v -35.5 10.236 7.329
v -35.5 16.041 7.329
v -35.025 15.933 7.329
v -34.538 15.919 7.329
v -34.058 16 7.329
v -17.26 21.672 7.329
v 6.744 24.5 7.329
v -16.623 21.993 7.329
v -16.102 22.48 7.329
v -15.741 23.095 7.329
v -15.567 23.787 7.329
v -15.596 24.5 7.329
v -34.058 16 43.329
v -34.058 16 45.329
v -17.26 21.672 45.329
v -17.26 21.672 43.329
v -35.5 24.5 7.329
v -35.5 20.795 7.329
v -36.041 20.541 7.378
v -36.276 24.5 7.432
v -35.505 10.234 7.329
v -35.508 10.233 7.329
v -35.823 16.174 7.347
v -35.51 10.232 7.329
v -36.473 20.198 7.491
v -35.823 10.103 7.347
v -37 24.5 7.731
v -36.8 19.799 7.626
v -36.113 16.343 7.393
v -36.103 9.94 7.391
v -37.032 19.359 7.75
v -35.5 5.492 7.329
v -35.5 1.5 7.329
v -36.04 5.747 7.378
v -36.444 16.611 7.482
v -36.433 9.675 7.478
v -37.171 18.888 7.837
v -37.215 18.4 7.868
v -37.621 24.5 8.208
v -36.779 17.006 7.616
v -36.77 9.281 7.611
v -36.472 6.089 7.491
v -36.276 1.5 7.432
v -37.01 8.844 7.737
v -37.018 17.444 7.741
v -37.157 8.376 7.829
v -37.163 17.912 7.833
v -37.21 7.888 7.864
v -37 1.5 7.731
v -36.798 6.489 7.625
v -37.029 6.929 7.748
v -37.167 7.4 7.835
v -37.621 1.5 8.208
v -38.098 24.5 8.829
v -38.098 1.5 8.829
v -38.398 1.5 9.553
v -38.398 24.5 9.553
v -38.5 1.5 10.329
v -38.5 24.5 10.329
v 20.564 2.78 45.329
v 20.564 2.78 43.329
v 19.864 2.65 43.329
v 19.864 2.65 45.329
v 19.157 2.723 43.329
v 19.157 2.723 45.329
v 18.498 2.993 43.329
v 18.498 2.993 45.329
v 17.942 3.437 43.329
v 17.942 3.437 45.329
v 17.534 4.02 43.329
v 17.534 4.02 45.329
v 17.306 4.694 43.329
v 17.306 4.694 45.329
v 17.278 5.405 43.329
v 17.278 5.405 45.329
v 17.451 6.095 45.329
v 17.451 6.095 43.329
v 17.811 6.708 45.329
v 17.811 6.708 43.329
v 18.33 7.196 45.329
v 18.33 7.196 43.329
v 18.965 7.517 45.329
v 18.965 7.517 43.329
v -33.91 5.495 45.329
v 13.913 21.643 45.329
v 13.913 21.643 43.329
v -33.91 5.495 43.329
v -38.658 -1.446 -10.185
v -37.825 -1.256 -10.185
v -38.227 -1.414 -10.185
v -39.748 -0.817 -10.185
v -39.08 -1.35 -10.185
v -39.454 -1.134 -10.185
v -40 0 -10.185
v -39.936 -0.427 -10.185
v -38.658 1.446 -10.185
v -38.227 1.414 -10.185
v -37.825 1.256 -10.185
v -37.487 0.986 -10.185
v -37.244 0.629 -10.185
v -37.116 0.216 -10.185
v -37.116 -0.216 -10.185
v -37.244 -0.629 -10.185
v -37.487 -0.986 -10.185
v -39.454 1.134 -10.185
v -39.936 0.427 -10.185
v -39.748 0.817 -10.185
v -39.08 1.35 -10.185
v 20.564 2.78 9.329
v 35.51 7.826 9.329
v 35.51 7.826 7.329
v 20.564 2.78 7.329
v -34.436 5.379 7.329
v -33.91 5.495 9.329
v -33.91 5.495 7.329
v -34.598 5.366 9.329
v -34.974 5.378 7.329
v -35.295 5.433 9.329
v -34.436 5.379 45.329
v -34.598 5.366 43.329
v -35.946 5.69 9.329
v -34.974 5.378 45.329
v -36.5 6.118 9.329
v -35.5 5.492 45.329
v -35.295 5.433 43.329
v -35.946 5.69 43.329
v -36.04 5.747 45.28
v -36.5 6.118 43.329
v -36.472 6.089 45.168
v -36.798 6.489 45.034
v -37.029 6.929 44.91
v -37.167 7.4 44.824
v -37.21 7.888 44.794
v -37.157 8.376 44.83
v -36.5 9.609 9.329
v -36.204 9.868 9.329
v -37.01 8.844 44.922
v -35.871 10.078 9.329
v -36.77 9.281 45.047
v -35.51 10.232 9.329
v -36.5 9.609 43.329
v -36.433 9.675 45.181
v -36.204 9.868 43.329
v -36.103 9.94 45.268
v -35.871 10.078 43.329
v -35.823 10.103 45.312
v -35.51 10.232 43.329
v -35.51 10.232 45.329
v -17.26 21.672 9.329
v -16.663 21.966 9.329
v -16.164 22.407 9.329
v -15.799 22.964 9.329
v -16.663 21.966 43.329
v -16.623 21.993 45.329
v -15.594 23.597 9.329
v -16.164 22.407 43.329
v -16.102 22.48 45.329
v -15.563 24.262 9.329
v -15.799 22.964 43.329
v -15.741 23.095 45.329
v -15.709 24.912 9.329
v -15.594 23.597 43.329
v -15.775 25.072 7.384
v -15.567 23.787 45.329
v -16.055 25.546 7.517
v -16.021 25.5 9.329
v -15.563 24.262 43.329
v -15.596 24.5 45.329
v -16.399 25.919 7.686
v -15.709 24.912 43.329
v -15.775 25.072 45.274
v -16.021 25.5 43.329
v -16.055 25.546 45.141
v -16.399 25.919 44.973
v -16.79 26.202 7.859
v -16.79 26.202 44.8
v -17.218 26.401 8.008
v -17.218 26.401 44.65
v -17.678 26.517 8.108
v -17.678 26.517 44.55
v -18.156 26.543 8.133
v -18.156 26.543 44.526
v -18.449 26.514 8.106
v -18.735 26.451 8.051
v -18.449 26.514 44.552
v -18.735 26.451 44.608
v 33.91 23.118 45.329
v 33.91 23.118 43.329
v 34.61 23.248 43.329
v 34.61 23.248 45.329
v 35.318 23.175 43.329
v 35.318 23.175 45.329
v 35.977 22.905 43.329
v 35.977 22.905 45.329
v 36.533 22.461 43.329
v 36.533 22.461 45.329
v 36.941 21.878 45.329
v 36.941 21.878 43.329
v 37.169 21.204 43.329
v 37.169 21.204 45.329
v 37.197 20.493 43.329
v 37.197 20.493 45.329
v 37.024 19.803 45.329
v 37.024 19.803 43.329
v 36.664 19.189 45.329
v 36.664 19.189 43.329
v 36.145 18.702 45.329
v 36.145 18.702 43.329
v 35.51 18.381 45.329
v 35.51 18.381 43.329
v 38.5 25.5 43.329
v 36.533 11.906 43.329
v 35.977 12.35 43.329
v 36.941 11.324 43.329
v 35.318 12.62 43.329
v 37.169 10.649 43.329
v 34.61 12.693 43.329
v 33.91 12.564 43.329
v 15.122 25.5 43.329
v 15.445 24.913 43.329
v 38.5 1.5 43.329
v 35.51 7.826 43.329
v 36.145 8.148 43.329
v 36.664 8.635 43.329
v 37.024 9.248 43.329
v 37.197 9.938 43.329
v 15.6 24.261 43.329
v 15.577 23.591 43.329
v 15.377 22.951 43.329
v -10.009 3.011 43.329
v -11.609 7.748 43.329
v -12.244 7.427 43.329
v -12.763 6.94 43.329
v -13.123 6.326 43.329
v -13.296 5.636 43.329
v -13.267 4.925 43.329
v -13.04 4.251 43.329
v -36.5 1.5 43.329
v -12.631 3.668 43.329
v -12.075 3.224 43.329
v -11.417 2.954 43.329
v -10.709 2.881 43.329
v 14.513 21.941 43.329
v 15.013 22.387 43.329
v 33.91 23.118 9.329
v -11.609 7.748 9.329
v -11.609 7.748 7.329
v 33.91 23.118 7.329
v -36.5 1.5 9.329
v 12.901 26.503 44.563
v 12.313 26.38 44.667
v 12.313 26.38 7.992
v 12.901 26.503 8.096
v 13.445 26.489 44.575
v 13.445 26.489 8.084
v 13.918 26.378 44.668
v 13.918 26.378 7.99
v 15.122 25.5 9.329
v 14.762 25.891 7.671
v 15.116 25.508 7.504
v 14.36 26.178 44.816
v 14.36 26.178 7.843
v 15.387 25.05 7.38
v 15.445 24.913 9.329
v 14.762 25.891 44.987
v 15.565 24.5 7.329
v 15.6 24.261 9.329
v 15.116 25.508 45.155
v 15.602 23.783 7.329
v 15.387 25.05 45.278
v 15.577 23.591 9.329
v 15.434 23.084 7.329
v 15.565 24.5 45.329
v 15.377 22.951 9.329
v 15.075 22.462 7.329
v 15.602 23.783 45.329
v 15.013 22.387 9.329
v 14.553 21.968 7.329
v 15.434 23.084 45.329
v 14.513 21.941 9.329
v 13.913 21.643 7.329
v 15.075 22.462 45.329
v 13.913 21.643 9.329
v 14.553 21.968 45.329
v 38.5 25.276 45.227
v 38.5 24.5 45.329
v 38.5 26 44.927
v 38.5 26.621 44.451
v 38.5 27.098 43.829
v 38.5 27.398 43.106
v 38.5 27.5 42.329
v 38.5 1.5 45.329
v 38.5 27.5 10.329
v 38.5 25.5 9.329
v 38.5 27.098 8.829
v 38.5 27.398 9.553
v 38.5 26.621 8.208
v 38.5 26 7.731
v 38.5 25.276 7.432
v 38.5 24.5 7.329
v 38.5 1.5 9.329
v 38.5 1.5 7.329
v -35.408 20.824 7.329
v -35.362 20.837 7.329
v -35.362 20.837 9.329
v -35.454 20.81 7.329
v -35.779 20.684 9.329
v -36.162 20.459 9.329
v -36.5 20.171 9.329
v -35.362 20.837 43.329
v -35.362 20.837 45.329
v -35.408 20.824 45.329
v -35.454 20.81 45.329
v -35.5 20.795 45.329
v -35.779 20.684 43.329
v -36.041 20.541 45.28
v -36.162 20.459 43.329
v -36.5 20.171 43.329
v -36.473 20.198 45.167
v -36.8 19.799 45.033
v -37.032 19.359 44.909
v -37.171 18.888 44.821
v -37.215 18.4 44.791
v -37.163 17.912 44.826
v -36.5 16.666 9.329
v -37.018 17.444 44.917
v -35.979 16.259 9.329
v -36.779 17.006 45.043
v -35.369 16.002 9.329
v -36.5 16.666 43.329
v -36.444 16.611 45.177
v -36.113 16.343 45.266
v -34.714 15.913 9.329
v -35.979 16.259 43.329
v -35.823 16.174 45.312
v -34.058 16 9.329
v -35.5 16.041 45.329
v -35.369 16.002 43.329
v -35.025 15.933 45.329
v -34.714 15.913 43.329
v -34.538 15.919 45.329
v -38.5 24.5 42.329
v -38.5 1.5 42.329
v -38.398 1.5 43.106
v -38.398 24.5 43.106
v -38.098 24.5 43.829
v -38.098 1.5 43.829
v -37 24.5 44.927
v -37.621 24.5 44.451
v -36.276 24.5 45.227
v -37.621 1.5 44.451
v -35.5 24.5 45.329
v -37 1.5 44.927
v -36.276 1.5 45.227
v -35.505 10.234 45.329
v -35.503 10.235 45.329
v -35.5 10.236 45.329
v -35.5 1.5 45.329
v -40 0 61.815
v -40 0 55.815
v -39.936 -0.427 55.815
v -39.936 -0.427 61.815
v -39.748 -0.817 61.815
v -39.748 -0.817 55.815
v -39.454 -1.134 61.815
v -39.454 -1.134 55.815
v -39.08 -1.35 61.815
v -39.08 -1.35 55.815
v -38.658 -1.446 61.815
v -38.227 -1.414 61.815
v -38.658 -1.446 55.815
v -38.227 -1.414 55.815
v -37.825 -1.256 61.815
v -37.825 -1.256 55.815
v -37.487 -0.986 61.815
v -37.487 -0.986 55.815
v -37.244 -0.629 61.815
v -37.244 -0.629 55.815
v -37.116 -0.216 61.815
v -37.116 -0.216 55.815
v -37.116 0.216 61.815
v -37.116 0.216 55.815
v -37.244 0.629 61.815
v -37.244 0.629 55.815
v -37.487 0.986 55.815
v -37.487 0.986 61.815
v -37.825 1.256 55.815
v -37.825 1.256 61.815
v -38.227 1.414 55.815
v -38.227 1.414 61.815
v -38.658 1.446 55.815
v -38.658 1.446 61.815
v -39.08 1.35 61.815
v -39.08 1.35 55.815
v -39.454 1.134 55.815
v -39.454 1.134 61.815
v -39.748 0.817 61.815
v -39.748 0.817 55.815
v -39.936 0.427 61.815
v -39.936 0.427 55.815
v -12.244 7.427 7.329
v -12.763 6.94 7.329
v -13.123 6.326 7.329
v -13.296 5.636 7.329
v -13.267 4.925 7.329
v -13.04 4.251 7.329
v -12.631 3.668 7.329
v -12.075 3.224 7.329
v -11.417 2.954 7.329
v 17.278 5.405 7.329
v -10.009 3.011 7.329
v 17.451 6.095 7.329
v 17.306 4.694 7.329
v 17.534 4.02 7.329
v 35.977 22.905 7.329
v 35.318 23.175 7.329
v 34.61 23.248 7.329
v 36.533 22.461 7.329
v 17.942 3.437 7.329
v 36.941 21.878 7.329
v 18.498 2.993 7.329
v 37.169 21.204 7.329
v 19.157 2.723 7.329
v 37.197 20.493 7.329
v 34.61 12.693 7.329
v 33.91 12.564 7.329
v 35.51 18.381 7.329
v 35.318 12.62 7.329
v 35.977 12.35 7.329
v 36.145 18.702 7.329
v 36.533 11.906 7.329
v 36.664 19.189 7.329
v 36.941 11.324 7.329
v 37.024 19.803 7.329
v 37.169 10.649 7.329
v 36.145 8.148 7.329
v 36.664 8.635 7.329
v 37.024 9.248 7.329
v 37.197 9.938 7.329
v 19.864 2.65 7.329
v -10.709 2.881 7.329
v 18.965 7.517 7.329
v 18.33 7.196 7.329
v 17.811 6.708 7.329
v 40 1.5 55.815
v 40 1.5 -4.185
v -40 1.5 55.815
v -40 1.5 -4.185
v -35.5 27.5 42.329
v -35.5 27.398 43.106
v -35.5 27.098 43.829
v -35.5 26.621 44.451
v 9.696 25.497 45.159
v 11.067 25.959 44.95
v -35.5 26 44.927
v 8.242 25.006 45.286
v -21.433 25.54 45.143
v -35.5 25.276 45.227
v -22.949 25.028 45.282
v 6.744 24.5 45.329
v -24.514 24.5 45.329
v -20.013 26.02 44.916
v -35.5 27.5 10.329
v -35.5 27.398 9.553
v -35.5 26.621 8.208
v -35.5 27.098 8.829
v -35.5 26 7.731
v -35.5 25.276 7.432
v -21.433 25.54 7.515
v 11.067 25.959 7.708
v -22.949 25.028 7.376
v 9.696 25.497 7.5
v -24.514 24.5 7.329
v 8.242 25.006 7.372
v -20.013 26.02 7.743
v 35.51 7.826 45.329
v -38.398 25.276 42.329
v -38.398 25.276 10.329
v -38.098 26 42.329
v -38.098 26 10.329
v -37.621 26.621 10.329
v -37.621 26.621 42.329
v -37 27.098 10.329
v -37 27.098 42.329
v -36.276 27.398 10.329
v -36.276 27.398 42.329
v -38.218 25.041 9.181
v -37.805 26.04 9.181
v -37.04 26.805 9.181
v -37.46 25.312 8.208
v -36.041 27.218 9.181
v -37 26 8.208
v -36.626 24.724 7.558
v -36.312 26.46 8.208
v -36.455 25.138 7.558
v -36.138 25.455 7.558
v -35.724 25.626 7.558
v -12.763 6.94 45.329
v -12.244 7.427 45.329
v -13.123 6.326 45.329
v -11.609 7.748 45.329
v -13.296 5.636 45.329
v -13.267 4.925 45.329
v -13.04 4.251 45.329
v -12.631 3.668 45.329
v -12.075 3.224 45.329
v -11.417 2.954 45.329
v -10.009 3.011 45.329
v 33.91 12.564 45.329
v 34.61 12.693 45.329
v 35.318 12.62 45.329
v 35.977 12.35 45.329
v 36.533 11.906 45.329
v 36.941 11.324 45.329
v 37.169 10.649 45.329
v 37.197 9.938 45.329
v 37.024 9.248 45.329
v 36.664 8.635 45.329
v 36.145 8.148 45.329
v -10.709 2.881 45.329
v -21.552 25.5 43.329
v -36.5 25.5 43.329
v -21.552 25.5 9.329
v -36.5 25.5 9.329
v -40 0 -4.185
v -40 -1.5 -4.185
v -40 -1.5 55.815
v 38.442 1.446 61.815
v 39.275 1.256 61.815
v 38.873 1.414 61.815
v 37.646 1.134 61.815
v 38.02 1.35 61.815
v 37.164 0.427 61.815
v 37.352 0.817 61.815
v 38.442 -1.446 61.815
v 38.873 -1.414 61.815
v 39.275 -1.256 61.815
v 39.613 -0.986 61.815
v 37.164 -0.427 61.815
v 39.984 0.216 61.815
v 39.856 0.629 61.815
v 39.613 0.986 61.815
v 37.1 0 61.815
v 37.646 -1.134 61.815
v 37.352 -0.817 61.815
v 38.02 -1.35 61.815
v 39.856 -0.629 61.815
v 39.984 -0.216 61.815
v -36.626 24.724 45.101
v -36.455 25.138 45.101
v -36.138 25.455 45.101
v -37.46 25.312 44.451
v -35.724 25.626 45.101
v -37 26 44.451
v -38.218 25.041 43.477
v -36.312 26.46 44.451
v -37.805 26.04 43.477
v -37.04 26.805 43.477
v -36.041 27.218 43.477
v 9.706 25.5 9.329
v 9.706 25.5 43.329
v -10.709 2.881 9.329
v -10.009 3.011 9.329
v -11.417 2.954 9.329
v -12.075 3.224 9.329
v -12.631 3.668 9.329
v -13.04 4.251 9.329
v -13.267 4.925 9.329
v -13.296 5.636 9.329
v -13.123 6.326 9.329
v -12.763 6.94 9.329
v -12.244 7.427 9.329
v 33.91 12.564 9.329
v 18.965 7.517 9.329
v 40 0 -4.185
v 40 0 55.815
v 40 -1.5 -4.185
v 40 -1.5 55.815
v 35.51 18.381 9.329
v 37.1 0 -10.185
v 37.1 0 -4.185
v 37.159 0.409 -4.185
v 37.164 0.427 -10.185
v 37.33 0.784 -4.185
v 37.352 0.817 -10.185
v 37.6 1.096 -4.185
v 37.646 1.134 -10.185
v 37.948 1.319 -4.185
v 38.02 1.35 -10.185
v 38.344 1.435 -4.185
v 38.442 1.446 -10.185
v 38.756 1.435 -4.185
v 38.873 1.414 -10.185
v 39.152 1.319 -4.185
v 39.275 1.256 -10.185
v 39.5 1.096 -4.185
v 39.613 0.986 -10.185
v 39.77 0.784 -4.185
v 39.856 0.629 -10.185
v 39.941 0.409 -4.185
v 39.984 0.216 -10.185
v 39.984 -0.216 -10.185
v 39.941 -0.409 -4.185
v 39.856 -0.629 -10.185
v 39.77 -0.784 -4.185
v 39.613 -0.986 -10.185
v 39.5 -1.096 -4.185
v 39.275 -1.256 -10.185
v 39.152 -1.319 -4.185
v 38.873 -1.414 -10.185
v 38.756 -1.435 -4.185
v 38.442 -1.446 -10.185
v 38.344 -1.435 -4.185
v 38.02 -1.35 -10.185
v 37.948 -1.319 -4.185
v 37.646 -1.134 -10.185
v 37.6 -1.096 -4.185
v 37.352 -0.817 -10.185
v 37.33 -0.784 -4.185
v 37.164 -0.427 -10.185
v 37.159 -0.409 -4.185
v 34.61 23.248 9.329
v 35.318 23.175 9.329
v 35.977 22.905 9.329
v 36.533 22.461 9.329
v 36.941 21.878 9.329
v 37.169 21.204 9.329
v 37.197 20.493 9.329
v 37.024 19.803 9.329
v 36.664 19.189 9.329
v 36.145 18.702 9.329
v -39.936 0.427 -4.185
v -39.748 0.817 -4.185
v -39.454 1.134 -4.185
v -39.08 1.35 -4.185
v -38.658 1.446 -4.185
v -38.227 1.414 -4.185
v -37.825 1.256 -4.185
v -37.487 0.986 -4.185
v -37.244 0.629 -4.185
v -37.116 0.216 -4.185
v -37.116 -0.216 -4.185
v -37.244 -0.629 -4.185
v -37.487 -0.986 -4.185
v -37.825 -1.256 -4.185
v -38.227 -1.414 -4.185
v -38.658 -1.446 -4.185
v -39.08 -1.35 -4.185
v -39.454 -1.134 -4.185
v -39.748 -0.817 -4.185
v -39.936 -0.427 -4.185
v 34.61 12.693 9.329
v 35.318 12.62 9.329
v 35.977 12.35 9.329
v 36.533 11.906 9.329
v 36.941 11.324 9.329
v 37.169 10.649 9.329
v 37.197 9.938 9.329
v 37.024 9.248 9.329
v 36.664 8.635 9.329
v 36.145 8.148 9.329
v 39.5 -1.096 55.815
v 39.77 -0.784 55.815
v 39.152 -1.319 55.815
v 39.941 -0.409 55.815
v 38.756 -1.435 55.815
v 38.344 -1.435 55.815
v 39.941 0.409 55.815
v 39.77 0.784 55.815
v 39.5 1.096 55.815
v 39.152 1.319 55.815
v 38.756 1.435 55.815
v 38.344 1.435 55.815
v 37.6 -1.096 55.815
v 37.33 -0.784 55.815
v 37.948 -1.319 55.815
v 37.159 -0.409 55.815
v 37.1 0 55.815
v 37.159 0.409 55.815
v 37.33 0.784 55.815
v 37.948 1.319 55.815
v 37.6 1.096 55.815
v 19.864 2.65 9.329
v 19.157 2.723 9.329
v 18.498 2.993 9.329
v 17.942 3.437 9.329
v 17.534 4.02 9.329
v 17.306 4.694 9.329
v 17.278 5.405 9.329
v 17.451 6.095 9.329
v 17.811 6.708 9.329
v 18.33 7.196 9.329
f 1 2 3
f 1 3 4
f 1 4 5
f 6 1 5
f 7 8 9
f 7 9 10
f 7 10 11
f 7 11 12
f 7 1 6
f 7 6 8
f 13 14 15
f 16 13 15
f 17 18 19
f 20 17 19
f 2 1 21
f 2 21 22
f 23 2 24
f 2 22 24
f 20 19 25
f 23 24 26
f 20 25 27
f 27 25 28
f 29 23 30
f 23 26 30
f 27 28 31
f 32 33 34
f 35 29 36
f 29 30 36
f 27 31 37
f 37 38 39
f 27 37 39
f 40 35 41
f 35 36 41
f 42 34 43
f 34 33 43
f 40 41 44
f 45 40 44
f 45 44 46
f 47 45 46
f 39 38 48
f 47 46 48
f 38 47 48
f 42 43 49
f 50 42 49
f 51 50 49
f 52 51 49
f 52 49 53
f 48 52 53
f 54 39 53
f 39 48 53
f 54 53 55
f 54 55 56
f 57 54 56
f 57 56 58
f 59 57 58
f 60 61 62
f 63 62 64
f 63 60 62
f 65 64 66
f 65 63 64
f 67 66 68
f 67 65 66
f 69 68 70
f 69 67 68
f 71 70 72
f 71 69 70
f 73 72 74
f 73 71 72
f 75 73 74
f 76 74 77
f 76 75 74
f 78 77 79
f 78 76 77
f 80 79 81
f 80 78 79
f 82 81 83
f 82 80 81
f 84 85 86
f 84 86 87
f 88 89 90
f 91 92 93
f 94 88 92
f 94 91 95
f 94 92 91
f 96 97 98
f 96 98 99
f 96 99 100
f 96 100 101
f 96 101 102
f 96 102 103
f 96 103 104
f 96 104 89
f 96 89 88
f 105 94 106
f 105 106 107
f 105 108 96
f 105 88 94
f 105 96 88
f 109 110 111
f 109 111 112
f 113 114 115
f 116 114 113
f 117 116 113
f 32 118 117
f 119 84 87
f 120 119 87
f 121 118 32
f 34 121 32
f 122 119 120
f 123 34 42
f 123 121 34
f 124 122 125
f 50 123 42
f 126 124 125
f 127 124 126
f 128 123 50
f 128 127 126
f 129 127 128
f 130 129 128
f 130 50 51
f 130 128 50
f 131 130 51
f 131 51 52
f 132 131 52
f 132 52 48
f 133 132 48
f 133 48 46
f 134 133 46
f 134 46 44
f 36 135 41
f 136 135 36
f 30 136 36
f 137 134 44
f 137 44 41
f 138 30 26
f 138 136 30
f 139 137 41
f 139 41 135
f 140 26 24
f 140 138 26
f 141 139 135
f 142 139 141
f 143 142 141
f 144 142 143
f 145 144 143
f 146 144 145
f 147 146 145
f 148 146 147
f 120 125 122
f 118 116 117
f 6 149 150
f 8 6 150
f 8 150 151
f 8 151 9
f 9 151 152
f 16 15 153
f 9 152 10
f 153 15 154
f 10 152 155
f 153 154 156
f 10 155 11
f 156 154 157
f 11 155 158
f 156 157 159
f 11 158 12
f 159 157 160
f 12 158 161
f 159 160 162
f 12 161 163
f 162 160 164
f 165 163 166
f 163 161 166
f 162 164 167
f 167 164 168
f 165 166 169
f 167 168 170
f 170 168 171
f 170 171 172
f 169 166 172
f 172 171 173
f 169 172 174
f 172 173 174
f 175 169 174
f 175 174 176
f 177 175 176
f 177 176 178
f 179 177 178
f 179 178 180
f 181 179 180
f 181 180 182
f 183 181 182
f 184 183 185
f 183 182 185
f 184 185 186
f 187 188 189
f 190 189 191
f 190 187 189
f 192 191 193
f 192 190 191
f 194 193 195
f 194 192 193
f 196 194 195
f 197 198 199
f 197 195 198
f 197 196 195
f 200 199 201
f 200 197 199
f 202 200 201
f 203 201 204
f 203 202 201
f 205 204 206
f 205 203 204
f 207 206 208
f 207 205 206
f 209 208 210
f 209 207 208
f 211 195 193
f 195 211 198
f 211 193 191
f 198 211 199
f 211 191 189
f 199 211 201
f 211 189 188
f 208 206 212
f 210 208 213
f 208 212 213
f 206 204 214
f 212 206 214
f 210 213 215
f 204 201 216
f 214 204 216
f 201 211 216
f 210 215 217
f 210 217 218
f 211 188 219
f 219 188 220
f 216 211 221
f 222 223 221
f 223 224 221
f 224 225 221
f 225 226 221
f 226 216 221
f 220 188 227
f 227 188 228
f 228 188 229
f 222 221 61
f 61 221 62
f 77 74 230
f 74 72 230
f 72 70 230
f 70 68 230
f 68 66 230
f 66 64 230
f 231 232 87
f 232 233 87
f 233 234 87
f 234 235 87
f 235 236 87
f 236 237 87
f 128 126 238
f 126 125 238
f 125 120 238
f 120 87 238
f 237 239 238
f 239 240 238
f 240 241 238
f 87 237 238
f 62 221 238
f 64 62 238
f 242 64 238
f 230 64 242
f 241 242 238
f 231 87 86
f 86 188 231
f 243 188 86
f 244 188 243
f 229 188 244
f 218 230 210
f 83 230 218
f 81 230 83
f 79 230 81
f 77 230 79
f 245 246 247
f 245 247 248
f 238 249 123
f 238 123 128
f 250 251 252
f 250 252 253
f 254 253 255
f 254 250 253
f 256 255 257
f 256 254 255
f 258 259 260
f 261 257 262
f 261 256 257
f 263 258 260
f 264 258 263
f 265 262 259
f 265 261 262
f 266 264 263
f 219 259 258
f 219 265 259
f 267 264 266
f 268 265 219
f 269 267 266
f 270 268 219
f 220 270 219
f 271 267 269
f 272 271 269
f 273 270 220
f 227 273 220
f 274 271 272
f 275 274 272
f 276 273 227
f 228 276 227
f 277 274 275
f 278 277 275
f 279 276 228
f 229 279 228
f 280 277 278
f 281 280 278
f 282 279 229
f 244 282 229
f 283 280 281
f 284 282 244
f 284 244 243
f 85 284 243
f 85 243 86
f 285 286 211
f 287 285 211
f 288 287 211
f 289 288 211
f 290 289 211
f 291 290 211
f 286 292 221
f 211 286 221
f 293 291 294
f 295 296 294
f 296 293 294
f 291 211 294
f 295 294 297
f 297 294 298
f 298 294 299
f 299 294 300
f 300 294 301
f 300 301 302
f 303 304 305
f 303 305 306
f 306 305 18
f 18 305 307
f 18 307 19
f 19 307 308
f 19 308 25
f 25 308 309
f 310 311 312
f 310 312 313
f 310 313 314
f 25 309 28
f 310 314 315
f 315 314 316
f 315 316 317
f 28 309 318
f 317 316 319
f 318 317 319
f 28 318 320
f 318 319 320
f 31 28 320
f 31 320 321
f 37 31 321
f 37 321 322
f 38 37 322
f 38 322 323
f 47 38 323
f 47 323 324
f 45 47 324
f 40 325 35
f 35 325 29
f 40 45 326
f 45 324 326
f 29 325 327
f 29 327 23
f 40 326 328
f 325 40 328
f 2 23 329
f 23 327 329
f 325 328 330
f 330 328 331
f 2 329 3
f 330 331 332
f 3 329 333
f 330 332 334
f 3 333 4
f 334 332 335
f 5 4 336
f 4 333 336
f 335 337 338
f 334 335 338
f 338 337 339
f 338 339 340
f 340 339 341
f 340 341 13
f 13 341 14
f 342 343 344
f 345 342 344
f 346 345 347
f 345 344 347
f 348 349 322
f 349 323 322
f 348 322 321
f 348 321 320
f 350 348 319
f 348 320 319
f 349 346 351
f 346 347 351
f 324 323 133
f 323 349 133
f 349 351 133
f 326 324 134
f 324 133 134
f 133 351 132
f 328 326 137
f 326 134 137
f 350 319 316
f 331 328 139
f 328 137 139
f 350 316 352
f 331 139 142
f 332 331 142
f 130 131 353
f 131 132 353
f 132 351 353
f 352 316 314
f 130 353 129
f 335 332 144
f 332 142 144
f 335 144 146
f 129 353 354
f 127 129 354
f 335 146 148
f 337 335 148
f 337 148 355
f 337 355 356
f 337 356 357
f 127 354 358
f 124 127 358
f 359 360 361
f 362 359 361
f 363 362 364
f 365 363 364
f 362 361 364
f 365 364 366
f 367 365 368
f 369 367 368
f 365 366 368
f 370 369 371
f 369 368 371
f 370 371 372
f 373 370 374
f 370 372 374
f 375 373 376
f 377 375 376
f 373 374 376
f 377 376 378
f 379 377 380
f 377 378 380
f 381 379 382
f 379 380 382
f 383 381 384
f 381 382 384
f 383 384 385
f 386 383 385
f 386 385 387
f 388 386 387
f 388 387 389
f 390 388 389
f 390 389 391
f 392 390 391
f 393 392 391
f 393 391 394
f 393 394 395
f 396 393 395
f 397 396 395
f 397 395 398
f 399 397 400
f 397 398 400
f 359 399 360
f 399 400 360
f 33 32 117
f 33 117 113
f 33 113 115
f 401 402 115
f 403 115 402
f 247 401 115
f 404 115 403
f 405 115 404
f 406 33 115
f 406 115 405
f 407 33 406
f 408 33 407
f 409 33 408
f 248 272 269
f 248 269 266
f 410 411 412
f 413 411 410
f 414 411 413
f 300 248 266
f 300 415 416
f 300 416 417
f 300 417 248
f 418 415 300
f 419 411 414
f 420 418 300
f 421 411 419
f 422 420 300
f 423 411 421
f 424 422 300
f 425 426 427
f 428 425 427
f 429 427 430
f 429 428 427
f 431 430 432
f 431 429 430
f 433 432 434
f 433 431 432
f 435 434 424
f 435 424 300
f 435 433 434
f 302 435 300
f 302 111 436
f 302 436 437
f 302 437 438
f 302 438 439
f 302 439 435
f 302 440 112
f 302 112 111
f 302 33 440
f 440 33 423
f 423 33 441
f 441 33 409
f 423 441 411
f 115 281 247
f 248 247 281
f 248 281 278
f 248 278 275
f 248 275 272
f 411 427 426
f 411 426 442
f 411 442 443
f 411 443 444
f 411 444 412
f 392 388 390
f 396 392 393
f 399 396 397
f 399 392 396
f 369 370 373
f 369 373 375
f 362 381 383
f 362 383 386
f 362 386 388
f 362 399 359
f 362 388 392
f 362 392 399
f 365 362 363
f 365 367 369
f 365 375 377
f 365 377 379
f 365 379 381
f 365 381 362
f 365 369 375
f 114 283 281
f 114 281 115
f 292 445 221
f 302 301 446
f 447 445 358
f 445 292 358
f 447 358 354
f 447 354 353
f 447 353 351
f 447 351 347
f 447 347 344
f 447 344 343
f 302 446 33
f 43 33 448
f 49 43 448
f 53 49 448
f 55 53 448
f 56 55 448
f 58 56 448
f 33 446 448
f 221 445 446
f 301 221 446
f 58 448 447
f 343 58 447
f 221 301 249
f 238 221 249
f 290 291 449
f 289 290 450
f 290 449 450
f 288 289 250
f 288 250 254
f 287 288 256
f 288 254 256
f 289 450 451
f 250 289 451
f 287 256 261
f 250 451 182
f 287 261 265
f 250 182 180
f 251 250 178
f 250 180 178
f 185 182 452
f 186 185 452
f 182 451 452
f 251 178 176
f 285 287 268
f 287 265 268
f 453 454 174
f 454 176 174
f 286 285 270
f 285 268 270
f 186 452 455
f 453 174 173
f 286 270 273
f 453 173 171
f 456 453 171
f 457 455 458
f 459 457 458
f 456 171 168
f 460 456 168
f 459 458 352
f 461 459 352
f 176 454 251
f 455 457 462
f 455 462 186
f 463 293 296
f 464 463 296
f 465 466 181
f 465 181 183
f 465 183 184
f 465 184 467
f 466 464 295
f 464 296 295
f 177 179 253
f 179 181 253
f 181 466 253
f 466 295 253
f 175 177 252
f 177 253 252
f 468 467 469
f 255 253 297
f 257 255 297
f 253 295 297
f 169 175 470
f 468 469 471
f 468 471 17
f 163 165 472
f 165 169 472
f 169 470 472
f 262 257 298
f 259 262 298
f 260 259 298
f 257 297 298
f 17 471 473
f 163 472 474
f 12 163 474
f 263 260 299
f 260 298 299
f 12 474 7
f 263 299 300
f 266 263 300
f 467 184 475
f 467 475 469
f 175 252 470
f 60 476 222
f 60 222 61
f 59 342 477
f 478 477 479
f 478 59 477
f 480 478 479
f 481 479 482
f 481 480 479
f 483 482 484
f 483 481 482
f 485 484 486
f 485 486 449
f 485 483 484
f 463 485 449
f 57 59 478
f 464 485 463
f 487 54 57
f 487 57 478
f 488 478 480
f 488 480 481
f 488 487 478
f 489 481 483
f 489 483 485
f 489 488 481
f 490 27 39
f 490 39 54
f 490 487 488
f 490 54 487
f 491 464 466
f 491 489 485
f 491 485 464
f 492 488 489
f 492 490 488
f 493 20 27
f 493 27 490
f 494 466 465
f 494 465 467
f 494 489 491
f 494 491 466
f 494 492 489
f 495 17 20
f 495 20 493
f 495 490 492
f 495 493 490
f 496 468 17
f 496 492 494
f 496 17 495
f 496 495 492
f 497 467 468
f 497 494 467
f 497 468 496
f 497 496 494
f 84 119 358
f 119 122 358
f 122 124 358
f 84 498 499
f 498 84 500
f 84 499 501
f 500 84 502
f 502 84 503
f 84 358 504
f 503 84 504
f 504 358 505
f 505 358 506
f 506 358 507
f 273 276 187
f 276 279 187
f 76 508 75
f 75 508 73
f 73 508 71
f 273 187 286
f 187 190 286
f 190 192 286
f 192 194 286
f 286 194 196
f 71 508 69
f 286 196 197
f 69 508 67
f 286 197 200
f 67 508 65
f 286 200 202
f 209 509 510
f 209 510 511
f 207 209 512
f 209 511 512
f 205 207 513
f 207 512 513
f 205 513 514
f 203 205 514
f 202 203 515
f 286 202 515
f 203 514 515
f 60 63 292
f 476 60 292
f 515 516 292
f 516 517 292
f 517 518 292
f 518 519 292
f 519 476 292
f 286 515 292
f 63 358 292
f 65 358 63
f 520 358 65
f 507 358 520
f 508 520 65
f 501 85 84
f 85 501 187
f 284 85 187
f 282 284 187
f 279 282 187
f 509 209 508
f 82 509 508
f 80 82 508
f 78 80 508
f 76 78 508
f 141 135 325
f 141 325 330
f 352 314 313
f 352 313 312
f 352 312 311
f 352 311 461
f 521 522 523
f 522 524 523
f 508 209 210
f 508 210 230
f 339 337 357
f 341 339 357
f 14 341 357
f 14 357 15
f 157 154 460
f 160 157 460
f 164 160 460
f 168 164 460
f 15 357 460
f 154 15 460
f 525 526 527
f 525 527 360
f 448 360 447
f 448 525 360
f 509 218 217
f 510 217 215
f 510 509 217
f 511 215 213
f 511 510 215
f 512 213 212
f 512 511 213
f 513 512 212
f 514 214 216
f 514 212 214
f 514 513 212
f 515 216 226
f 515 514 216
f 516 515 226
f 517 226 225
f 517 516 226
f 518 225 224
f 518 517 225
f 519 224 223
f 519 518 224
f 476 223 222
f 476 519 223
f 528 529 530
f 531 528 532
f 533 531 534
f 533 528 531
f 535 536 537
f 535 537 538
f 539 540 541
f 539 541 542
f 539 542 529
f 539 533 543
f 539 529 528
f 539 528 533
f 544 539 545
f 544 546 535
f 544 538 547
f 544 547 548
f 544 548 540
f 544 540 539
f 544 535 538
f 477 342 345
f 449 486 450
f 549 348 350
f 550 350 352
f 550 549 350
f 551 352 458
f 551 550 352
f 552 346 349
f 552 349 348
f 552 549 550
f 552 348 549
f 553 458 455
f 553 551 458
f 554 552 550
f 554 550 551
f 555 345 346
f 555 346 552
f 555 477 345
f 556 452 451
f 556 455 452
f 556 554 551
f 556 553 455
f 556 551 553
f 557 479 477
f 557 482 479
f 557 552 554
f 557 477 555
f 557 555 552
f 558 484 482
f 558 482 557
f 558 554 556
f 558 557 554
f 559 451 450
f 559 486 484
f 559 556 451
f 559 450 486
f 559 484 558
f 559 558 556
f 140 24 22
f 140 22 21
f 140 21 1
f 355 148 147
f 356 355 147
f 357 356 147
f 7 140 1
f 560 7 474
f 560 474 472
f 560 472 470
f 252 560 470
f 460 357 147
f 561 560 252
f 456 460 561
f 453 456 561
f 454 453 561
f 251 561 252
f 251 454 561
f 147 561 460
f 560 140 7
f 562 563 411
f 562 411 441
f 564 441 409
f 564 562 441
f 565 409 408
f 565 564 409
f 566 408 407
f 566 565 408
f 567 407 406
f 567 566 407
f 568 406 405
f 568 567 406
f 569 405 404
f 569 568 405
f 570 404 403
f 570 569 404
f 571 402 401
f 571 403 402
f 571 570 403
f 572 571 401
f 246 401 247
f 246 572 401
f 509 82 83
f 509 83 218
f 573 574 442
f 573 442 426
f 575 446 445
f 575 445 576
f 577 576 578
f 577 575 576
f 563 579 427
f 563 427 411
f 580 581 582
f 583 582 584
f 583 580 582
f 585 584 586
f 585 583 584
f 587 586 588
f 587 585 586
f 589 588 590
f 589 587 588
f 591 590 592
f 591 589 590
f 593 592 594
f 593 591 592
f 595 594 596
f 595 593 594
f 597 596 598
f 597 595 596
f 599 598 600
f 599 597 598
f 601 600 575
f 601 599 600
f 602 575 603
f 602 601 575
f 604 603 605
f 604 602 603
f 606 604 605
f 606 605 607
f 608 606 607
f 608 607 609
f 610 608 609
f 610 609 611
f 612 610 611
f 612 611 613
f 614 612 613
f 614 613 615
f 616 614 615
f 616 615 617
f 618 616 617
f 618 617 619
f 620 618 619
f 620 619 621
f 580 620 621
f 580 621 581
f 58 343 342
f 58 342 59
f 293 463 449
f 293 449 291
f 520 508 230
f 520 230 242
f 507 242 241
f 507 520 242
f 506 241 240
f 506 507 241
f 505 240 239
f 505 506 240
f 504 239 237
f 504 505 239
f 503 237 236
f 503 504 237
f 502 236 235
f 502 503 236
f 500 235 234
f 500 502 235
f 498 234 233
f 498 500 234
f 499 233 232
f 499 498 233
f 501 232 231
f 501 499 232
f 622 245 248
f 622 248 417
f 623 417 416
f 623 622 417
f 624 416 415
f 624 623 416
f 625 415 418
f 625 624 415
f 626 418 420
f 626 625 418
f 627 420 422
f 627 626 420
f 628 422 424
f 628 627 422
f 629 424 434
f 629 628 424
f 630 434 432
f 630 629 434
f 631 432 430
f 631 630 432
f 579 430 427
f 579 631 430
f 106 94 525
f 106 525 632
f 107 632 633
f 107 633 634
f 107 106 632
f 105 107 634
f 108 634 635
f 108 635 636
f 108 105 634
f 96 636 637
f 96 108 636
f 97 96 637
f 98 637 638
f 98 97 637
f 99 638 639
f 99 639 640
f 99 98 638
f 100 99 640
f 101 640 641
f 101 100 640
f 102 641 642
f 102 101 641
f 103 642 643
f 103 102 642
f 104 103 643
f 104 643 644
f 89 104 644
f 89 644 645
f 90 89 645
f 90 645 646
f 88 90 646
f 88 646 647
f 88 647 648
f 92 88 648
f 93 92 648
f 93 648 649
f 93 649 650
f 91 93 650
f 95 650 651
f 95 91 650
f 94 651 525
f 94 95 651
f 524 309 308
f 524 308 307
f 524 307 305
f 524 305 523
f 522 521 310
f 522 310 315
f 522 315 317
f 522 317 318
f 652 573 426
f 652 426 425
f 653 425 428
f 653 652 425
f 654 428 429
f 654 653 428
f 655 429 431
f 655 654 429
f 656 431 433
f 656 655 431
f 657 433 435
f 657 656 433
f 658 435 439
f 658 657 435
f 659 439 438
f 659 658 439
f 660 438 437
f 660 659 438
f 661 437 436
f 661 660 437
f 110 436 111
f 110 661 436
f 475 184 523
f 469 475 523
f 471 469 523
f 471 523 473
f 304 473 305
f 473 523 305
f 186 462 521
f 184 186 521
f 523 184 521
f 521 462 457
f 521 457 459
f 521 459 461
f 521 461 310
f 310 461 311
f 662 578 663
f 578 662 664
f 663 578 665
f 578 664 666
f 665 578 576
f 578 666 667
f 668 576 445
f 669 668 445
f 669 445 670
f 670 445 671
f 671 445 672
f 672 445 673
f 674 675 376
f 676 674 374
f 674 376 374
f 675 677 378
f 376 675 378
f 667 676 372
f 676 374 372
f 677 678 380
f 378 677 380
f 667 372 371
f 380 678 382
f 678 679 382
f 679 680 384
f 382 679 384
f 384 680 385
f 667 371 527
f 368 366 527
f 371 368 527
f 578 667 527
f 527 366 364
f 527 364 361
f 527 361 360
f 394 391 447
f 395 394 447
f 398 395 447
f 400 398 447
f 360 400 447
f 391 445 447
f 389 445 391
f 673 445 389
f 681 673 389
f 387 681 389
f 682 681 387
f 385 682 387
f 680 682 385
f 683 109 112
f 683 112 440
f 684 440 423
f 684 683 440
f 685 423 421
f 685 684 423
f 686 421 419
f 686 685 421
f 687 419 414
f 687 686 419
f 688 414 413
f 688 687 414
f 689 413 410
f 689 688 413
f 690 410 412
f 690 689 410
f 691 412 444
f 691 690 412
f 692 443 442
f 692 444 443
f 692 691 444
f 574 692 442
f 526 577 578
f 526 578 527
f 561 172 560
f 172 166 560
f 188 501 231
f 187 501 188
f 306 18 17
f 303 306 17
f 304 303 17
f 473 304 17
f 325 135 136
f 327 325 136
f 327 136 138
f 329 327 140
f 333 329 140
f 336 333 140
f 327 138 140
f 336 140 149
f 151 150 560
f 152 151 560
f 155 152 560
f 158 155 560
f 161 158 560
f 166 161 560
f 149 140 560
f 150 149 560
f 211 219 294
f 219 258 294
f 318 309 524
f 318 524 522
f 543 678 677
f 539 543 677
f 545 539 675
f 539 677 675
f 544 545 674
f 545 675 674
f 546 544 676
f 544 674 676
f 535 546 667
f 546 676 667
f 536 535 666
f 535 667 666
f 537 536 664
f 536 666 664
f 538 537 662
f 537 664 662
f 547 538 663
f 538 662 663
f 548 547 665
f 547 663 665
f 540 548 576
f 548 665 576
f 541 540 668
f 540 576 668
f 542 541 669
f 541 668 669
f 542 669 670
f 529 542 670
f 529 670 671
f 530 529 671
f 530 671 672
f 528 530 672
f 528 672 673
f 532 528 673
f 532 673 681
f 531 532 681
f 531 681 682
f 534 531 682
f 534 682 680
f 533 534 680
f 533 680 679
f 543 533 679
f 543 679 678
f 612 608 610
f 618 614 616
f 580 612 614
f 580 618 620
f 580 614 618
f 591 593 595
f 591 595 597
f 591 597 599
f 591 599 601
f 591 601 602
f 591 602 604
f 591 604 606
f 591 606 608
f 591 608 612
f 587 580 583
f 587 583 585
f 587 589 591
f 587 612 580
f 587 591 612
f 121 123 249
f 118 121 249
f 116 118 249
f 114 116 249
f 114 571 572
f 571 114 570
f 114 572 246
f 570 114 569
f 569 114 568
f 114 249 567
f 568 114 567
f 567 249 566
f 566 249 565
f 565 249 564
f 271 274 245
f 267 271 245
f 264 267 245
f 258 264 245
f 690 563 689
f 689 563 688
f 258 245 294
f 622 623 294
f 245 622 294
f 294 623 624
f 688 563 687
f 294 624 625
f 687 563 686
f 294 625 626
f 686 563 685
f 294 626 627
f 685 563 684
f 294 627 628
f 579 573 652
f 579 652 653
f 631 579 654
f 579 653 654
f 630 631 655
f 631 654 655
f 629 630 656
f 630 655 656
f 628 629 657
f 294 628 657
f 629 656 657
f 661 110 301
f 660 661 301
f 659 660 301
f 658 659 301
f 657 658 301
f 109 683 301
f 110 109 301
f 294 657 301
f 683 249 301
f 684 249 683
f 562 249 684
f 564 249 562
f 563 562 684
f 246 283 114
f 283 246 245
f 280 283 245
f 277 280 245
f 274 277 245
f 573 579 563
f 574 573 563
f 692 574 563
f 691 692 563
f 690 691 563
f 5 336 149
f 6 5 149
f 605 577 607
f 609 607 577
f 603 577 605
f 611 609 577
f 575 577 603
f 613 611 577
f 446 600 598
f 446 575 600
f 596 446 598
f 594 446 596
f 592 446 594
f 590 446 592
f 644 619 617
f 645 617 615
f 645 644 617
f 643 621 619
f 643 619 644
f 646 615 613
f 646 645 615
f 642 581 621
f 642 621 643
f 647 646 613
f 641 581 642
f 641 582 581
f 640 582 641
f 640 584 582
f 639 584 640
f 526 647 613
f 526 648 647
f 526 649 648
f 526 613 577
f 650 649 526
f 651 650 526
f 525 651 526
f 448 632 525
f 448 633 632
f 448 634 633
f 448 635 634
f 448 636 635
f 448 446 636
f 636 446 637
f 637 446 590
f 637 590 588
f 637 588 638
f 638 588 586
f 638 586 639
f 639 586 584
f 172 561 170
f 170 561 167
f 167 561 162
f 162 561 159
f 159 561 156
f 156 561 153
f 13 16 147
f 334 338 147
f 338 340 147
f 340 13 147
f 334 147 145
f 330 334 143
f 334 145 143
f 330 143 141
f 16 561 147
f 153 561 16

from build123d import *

# Parameters (mm, degrees)
EXTRUDE_1_DEPTH      = 55.815
EXTRUDE_1_DEPTH_BACK = 4.185
EXTRUDE_4_DEPTH      = 24
SKETCH_13_R          = 1.45
EXTRUDE_5_DEPTH      = 6
EXTRUDE_START        = 6
SKETCH_14_R          = 1.45
EXTRUDE_6_DEPTH      = 6
SKETCH_15_W          = 77
SKETCH_15_H          = 37.999949308
EXTRUDE_7_DEPTH      = 2
CUT_EXTRUDE_2_DEPTH  = 38
FILLET_2_R           = 3
FILLET_3_R           = 3
FILLET_4_R           = 3


with BuildPart() as part:
    # 草图1 → 凸台-拉伸1 (new, two sides: drawn at the far end of the back side and taken through both)
    with BuildSketch(Plane.XY.offset(-EXTRUDE_1_DEPTH_BACK)):
        Polygon((0, 1.5), (30, 1.5), (40, 1.5), (40, -1.5), (-40, -1.5), (-40, 1.5), align=None)
    extrude(amount=EXTRUDE_1_DEPTH + EXTRUDE_1_DEPTH_BACK)

    # 草图11 → 凸台-拉伸4 (add)
    with BuildSketch(Plane(origin=(0, 1.5, 0), x_dir=(1, 0, 0), z_dir=(0, 1, 0))):
        Polygon((36.5, -9.329285225), (-36.5, -9.329285225), (-36.5, -43.329234533), (36.5, -43.329234533), (38.5, -43.329234533), (38.5, -45.329234533), (-38.5, -45.329234533), (-38.5, -9.329285225), (-38.5, -7.329285225), (36.5, -7.329285225), (38.5, -7.329285225), (38.5, -9.329285225), align=None)
    extrude(amount=EXTRUDE_4_DEPTH)

    # 草图13 → 凸台-拉伸5 (add)
    with BuildSketch(Plane.XY.offset(55.815)):
        with Locations(Location((-38.55, 0, 0), (0, 0, 180))):
            Circle(SKETCH_13_R)
        with Locations(Location((38.55, 0, 0), (0, 0, 180))):
            Circle(SKETCH_13_R)
    extrude(amount=EXTRUDE_5_DEPTH)

    # 草图14 → 凸台-拉伸6 (add)
    with BuildSketch(Plane(origin=(0, 0, -4.185), x_dir=(-1, 0, 0), z_dir=(0, 0, -1)).offset(EXTRUDE_START)):
        with Locations((-38.55, 0)):
            Circle(SKETCH_14_R)
        with Locations((38.55, 0)):
            Circle(SKETCH_14_R)
    extrude(amount=-EXTRUDE_6_DEPTH)

    # 草图15 → 凸台-拉伸7 (add)
    with BuildSketch(Plane(origin=(0, 25.5, 0), x_dir=(1, 0, 0), z_dir=(0, 1, 0))):
        with Locations((0, -26.329259879)):
            Rectangle(SKETCH_15_W, SKETCH_15_H)
    extrude(amount=EXTRUDE_7_DEPTH)

    # 草图16 → 切除-拉伸2 (cut)
    with BuildSketch(Plane.XY.offset(45.329234533)):
        with BuildLine():
            Line((-18.734540656, 26.451398681), (-35.362355257, 20.836811932))
            ThreePointArc((-35.362355257, 20.836811932), (-37.12868865, 17.766202685), (-34.058079403, 15.999869293))
            Line((-34.058079403, 15.999869293), (-17.260126249, 21.671905422))
            ThreePointArc((-17.260126249, 21.671905422), (-15.664993145, 24.781150117), (-18.734540656, 26.451398681))
        make_face()
        with BuildLine():
            Line((-35.510009127, 10.232259834), (12.313007681, 26.380291484))
            ThreePointArc((12.313007681, 26.380291484), (15.481413648, 24.811469112), (13.912591276, 21.643063146))
            Line((13.912591276, 21.643063146), (-33.910425533, 5.495031496))
            ThreePointArc((-33.910425533, 5.495031496), (-37.078831499, 7.063853868), (-35.510009127, 10.232259834))
        make_face()
        with BuildLine():
            Line((-11.608912214, 7.748065143), (33.910425533, 23.118231136))
            ThreePointArc((33.910425533, 23.118231136), (37.078831499, 21.549408764), (35.510009127, 18.381002798))
            Line((35.510009127, 18.381002798), (-10.009328619, 3.010836806))
            ThreePointArc((-10.009328619, 3.010836806), (-13.177734585, 4.579659177), (-11.608912214, 7.748065143))
        make_face()
        with BuildLine():
            Line((18.964604183, 7.516895213), (33.910425533, 12.563536189))
            ThreePointArc((33.910425533, 12.563536189), (37.078831499, 10.994713817), (35.510009127, 7.826307851))
            Line((35.510009127, 7.826307851), (20.564187778, 2.779666876))
            ThreePointArc((20.564187778, 2.779666876), (17.395781811, 4.348489247), (18.964604183, 7.516895213))
        make_face()
    extrude(amount=-CUT_EXTRUDE_2_DEPTH, mode=Mode.SUBTRACT)

    # 圆角2
    fillet_2_edges = [part.edges().sort_by_distance(p)[0] for p in [
        (-38.5, 27.5, 26.329259879),
    ]]
    fillet(fillet_2_edges, radius=FILLET_2_R)

    # 圆角3
    # the kernel refuses this fillet: 3 mm, written as the material it takes off along each edge
    with BuildSketch(Plane(origin=(-38.5, 1.5, 7.329285225), x_dir=(1, 0, 0), z_dir=(0, 1, 0))) as fillet_3_piece_1:
        with BuildLine():
            CenterArc((FILLET_3_R, -FILLET_3_R), FILLET_3_R, 90, 90)
            Line((0, -FILLET_3_R), (0, 0))
            Line((0, 0), (FILLET_3_R, 0))
        make_face()
    extrude(amount=23, mode=Mode.SUBTRACT)
    with BuildSketch(Plane(origin=(-35.5, 24.5, 7.329285225), x_dir=(-1, 0, 0), z_dir=(0, -1, 0))) as fillet_3_piece_2:
        with BuildLine():
            CenterArc((3 - FILLET_3_R, -FILLET_3_R), FILLET_3_R, 0, 90)
            Line((3, -FILLET_3_R), (3, 0))
            Line((3, 0), (3 - FILLET_3_R, 0))
        make_face()
    revolve(axis=Axis((-35.5, 24.5, 7.329285225), (0, 0, -1)), revolution_arc=90, mode=Mode.SUBTRACT)
    with BuildSketch(Plane(origin=(46, 27.5, 7.329285225), x_dir=(0, -1, 0), z_dir=(-1, 0, 0))) as fillet_3_piece_3:
        with BuildLine():
            CenterArc((FILLET_3_R, FILLET_3_R), FILLET_3_R, 180, 90)
            Line((0, FILLET_3_R), (0, 0))
            Line((0, 0), (FILLET_3_R, 0))
        make_face()
    extrude(amount=81.5, mode=Mode.SUBTRACT)

    # 圆角4
    # the kernel refuses this fillet: 3 mm, written as the material it takes off along each edge
    with BuildSketch(Plane(origin=(-35.5, 27.5, 45.329234533), x_dir=(0, -1, 0), z_dir=(1, 0, 0))) as fillet_4_piece_1:
        with BuildLine():
            CenterArc((FILLET_4_R, FILLET_4_R), FILLET_4_R, 180, 90)
            Line((0, FILLET_4_R), (0, 0))
            Line((0, 0), (FILLET_4_R, 0))
        make_face()
    extrude(amount=81.5, mode=Mode.SUBTRACT)
    with BuildSketch(Plane(origin=(-38.5, 1.5, 45.329234533), x_dir=(1, 0, 0), z_dir=(0, 1, 0))) as fillet_4_piece_2:
        with BuildLine():
            CenterArc((FILLET_4_R, FILLET_4_R), FILLET_4_R, 180, 90)
            Line((0, FILLET_4_R), (0, 0))
            Line((0, 0), (FILLET_4_R, 0))
        make_face()
    extrude(amount=23, mode=Mode.SUBTRACT)
    with BuildSketch(Plane(origin=(-35.5, 24.5, 45.329234533), x_dir=(-1, 0, 0), z_dir=(0, -1, 0))) as fillet_4_piece_3:
        with BuildLine():
            CenterArc((3 - FILLET_4_R, FILLET_4_R), FILLET_4_R, 270, 90)
            Line((3, FILLET_4_R), (3, 0))
            Line((3, 0), (3 - FILLET_4_R, 0))
        make_face()
    revolve(axis=Axis((-35.5, 24.5, 45.329234533), (0, 0, -1)), revolution_arc=90, mode=Mode.SUBTRACT)


solid = part.part
